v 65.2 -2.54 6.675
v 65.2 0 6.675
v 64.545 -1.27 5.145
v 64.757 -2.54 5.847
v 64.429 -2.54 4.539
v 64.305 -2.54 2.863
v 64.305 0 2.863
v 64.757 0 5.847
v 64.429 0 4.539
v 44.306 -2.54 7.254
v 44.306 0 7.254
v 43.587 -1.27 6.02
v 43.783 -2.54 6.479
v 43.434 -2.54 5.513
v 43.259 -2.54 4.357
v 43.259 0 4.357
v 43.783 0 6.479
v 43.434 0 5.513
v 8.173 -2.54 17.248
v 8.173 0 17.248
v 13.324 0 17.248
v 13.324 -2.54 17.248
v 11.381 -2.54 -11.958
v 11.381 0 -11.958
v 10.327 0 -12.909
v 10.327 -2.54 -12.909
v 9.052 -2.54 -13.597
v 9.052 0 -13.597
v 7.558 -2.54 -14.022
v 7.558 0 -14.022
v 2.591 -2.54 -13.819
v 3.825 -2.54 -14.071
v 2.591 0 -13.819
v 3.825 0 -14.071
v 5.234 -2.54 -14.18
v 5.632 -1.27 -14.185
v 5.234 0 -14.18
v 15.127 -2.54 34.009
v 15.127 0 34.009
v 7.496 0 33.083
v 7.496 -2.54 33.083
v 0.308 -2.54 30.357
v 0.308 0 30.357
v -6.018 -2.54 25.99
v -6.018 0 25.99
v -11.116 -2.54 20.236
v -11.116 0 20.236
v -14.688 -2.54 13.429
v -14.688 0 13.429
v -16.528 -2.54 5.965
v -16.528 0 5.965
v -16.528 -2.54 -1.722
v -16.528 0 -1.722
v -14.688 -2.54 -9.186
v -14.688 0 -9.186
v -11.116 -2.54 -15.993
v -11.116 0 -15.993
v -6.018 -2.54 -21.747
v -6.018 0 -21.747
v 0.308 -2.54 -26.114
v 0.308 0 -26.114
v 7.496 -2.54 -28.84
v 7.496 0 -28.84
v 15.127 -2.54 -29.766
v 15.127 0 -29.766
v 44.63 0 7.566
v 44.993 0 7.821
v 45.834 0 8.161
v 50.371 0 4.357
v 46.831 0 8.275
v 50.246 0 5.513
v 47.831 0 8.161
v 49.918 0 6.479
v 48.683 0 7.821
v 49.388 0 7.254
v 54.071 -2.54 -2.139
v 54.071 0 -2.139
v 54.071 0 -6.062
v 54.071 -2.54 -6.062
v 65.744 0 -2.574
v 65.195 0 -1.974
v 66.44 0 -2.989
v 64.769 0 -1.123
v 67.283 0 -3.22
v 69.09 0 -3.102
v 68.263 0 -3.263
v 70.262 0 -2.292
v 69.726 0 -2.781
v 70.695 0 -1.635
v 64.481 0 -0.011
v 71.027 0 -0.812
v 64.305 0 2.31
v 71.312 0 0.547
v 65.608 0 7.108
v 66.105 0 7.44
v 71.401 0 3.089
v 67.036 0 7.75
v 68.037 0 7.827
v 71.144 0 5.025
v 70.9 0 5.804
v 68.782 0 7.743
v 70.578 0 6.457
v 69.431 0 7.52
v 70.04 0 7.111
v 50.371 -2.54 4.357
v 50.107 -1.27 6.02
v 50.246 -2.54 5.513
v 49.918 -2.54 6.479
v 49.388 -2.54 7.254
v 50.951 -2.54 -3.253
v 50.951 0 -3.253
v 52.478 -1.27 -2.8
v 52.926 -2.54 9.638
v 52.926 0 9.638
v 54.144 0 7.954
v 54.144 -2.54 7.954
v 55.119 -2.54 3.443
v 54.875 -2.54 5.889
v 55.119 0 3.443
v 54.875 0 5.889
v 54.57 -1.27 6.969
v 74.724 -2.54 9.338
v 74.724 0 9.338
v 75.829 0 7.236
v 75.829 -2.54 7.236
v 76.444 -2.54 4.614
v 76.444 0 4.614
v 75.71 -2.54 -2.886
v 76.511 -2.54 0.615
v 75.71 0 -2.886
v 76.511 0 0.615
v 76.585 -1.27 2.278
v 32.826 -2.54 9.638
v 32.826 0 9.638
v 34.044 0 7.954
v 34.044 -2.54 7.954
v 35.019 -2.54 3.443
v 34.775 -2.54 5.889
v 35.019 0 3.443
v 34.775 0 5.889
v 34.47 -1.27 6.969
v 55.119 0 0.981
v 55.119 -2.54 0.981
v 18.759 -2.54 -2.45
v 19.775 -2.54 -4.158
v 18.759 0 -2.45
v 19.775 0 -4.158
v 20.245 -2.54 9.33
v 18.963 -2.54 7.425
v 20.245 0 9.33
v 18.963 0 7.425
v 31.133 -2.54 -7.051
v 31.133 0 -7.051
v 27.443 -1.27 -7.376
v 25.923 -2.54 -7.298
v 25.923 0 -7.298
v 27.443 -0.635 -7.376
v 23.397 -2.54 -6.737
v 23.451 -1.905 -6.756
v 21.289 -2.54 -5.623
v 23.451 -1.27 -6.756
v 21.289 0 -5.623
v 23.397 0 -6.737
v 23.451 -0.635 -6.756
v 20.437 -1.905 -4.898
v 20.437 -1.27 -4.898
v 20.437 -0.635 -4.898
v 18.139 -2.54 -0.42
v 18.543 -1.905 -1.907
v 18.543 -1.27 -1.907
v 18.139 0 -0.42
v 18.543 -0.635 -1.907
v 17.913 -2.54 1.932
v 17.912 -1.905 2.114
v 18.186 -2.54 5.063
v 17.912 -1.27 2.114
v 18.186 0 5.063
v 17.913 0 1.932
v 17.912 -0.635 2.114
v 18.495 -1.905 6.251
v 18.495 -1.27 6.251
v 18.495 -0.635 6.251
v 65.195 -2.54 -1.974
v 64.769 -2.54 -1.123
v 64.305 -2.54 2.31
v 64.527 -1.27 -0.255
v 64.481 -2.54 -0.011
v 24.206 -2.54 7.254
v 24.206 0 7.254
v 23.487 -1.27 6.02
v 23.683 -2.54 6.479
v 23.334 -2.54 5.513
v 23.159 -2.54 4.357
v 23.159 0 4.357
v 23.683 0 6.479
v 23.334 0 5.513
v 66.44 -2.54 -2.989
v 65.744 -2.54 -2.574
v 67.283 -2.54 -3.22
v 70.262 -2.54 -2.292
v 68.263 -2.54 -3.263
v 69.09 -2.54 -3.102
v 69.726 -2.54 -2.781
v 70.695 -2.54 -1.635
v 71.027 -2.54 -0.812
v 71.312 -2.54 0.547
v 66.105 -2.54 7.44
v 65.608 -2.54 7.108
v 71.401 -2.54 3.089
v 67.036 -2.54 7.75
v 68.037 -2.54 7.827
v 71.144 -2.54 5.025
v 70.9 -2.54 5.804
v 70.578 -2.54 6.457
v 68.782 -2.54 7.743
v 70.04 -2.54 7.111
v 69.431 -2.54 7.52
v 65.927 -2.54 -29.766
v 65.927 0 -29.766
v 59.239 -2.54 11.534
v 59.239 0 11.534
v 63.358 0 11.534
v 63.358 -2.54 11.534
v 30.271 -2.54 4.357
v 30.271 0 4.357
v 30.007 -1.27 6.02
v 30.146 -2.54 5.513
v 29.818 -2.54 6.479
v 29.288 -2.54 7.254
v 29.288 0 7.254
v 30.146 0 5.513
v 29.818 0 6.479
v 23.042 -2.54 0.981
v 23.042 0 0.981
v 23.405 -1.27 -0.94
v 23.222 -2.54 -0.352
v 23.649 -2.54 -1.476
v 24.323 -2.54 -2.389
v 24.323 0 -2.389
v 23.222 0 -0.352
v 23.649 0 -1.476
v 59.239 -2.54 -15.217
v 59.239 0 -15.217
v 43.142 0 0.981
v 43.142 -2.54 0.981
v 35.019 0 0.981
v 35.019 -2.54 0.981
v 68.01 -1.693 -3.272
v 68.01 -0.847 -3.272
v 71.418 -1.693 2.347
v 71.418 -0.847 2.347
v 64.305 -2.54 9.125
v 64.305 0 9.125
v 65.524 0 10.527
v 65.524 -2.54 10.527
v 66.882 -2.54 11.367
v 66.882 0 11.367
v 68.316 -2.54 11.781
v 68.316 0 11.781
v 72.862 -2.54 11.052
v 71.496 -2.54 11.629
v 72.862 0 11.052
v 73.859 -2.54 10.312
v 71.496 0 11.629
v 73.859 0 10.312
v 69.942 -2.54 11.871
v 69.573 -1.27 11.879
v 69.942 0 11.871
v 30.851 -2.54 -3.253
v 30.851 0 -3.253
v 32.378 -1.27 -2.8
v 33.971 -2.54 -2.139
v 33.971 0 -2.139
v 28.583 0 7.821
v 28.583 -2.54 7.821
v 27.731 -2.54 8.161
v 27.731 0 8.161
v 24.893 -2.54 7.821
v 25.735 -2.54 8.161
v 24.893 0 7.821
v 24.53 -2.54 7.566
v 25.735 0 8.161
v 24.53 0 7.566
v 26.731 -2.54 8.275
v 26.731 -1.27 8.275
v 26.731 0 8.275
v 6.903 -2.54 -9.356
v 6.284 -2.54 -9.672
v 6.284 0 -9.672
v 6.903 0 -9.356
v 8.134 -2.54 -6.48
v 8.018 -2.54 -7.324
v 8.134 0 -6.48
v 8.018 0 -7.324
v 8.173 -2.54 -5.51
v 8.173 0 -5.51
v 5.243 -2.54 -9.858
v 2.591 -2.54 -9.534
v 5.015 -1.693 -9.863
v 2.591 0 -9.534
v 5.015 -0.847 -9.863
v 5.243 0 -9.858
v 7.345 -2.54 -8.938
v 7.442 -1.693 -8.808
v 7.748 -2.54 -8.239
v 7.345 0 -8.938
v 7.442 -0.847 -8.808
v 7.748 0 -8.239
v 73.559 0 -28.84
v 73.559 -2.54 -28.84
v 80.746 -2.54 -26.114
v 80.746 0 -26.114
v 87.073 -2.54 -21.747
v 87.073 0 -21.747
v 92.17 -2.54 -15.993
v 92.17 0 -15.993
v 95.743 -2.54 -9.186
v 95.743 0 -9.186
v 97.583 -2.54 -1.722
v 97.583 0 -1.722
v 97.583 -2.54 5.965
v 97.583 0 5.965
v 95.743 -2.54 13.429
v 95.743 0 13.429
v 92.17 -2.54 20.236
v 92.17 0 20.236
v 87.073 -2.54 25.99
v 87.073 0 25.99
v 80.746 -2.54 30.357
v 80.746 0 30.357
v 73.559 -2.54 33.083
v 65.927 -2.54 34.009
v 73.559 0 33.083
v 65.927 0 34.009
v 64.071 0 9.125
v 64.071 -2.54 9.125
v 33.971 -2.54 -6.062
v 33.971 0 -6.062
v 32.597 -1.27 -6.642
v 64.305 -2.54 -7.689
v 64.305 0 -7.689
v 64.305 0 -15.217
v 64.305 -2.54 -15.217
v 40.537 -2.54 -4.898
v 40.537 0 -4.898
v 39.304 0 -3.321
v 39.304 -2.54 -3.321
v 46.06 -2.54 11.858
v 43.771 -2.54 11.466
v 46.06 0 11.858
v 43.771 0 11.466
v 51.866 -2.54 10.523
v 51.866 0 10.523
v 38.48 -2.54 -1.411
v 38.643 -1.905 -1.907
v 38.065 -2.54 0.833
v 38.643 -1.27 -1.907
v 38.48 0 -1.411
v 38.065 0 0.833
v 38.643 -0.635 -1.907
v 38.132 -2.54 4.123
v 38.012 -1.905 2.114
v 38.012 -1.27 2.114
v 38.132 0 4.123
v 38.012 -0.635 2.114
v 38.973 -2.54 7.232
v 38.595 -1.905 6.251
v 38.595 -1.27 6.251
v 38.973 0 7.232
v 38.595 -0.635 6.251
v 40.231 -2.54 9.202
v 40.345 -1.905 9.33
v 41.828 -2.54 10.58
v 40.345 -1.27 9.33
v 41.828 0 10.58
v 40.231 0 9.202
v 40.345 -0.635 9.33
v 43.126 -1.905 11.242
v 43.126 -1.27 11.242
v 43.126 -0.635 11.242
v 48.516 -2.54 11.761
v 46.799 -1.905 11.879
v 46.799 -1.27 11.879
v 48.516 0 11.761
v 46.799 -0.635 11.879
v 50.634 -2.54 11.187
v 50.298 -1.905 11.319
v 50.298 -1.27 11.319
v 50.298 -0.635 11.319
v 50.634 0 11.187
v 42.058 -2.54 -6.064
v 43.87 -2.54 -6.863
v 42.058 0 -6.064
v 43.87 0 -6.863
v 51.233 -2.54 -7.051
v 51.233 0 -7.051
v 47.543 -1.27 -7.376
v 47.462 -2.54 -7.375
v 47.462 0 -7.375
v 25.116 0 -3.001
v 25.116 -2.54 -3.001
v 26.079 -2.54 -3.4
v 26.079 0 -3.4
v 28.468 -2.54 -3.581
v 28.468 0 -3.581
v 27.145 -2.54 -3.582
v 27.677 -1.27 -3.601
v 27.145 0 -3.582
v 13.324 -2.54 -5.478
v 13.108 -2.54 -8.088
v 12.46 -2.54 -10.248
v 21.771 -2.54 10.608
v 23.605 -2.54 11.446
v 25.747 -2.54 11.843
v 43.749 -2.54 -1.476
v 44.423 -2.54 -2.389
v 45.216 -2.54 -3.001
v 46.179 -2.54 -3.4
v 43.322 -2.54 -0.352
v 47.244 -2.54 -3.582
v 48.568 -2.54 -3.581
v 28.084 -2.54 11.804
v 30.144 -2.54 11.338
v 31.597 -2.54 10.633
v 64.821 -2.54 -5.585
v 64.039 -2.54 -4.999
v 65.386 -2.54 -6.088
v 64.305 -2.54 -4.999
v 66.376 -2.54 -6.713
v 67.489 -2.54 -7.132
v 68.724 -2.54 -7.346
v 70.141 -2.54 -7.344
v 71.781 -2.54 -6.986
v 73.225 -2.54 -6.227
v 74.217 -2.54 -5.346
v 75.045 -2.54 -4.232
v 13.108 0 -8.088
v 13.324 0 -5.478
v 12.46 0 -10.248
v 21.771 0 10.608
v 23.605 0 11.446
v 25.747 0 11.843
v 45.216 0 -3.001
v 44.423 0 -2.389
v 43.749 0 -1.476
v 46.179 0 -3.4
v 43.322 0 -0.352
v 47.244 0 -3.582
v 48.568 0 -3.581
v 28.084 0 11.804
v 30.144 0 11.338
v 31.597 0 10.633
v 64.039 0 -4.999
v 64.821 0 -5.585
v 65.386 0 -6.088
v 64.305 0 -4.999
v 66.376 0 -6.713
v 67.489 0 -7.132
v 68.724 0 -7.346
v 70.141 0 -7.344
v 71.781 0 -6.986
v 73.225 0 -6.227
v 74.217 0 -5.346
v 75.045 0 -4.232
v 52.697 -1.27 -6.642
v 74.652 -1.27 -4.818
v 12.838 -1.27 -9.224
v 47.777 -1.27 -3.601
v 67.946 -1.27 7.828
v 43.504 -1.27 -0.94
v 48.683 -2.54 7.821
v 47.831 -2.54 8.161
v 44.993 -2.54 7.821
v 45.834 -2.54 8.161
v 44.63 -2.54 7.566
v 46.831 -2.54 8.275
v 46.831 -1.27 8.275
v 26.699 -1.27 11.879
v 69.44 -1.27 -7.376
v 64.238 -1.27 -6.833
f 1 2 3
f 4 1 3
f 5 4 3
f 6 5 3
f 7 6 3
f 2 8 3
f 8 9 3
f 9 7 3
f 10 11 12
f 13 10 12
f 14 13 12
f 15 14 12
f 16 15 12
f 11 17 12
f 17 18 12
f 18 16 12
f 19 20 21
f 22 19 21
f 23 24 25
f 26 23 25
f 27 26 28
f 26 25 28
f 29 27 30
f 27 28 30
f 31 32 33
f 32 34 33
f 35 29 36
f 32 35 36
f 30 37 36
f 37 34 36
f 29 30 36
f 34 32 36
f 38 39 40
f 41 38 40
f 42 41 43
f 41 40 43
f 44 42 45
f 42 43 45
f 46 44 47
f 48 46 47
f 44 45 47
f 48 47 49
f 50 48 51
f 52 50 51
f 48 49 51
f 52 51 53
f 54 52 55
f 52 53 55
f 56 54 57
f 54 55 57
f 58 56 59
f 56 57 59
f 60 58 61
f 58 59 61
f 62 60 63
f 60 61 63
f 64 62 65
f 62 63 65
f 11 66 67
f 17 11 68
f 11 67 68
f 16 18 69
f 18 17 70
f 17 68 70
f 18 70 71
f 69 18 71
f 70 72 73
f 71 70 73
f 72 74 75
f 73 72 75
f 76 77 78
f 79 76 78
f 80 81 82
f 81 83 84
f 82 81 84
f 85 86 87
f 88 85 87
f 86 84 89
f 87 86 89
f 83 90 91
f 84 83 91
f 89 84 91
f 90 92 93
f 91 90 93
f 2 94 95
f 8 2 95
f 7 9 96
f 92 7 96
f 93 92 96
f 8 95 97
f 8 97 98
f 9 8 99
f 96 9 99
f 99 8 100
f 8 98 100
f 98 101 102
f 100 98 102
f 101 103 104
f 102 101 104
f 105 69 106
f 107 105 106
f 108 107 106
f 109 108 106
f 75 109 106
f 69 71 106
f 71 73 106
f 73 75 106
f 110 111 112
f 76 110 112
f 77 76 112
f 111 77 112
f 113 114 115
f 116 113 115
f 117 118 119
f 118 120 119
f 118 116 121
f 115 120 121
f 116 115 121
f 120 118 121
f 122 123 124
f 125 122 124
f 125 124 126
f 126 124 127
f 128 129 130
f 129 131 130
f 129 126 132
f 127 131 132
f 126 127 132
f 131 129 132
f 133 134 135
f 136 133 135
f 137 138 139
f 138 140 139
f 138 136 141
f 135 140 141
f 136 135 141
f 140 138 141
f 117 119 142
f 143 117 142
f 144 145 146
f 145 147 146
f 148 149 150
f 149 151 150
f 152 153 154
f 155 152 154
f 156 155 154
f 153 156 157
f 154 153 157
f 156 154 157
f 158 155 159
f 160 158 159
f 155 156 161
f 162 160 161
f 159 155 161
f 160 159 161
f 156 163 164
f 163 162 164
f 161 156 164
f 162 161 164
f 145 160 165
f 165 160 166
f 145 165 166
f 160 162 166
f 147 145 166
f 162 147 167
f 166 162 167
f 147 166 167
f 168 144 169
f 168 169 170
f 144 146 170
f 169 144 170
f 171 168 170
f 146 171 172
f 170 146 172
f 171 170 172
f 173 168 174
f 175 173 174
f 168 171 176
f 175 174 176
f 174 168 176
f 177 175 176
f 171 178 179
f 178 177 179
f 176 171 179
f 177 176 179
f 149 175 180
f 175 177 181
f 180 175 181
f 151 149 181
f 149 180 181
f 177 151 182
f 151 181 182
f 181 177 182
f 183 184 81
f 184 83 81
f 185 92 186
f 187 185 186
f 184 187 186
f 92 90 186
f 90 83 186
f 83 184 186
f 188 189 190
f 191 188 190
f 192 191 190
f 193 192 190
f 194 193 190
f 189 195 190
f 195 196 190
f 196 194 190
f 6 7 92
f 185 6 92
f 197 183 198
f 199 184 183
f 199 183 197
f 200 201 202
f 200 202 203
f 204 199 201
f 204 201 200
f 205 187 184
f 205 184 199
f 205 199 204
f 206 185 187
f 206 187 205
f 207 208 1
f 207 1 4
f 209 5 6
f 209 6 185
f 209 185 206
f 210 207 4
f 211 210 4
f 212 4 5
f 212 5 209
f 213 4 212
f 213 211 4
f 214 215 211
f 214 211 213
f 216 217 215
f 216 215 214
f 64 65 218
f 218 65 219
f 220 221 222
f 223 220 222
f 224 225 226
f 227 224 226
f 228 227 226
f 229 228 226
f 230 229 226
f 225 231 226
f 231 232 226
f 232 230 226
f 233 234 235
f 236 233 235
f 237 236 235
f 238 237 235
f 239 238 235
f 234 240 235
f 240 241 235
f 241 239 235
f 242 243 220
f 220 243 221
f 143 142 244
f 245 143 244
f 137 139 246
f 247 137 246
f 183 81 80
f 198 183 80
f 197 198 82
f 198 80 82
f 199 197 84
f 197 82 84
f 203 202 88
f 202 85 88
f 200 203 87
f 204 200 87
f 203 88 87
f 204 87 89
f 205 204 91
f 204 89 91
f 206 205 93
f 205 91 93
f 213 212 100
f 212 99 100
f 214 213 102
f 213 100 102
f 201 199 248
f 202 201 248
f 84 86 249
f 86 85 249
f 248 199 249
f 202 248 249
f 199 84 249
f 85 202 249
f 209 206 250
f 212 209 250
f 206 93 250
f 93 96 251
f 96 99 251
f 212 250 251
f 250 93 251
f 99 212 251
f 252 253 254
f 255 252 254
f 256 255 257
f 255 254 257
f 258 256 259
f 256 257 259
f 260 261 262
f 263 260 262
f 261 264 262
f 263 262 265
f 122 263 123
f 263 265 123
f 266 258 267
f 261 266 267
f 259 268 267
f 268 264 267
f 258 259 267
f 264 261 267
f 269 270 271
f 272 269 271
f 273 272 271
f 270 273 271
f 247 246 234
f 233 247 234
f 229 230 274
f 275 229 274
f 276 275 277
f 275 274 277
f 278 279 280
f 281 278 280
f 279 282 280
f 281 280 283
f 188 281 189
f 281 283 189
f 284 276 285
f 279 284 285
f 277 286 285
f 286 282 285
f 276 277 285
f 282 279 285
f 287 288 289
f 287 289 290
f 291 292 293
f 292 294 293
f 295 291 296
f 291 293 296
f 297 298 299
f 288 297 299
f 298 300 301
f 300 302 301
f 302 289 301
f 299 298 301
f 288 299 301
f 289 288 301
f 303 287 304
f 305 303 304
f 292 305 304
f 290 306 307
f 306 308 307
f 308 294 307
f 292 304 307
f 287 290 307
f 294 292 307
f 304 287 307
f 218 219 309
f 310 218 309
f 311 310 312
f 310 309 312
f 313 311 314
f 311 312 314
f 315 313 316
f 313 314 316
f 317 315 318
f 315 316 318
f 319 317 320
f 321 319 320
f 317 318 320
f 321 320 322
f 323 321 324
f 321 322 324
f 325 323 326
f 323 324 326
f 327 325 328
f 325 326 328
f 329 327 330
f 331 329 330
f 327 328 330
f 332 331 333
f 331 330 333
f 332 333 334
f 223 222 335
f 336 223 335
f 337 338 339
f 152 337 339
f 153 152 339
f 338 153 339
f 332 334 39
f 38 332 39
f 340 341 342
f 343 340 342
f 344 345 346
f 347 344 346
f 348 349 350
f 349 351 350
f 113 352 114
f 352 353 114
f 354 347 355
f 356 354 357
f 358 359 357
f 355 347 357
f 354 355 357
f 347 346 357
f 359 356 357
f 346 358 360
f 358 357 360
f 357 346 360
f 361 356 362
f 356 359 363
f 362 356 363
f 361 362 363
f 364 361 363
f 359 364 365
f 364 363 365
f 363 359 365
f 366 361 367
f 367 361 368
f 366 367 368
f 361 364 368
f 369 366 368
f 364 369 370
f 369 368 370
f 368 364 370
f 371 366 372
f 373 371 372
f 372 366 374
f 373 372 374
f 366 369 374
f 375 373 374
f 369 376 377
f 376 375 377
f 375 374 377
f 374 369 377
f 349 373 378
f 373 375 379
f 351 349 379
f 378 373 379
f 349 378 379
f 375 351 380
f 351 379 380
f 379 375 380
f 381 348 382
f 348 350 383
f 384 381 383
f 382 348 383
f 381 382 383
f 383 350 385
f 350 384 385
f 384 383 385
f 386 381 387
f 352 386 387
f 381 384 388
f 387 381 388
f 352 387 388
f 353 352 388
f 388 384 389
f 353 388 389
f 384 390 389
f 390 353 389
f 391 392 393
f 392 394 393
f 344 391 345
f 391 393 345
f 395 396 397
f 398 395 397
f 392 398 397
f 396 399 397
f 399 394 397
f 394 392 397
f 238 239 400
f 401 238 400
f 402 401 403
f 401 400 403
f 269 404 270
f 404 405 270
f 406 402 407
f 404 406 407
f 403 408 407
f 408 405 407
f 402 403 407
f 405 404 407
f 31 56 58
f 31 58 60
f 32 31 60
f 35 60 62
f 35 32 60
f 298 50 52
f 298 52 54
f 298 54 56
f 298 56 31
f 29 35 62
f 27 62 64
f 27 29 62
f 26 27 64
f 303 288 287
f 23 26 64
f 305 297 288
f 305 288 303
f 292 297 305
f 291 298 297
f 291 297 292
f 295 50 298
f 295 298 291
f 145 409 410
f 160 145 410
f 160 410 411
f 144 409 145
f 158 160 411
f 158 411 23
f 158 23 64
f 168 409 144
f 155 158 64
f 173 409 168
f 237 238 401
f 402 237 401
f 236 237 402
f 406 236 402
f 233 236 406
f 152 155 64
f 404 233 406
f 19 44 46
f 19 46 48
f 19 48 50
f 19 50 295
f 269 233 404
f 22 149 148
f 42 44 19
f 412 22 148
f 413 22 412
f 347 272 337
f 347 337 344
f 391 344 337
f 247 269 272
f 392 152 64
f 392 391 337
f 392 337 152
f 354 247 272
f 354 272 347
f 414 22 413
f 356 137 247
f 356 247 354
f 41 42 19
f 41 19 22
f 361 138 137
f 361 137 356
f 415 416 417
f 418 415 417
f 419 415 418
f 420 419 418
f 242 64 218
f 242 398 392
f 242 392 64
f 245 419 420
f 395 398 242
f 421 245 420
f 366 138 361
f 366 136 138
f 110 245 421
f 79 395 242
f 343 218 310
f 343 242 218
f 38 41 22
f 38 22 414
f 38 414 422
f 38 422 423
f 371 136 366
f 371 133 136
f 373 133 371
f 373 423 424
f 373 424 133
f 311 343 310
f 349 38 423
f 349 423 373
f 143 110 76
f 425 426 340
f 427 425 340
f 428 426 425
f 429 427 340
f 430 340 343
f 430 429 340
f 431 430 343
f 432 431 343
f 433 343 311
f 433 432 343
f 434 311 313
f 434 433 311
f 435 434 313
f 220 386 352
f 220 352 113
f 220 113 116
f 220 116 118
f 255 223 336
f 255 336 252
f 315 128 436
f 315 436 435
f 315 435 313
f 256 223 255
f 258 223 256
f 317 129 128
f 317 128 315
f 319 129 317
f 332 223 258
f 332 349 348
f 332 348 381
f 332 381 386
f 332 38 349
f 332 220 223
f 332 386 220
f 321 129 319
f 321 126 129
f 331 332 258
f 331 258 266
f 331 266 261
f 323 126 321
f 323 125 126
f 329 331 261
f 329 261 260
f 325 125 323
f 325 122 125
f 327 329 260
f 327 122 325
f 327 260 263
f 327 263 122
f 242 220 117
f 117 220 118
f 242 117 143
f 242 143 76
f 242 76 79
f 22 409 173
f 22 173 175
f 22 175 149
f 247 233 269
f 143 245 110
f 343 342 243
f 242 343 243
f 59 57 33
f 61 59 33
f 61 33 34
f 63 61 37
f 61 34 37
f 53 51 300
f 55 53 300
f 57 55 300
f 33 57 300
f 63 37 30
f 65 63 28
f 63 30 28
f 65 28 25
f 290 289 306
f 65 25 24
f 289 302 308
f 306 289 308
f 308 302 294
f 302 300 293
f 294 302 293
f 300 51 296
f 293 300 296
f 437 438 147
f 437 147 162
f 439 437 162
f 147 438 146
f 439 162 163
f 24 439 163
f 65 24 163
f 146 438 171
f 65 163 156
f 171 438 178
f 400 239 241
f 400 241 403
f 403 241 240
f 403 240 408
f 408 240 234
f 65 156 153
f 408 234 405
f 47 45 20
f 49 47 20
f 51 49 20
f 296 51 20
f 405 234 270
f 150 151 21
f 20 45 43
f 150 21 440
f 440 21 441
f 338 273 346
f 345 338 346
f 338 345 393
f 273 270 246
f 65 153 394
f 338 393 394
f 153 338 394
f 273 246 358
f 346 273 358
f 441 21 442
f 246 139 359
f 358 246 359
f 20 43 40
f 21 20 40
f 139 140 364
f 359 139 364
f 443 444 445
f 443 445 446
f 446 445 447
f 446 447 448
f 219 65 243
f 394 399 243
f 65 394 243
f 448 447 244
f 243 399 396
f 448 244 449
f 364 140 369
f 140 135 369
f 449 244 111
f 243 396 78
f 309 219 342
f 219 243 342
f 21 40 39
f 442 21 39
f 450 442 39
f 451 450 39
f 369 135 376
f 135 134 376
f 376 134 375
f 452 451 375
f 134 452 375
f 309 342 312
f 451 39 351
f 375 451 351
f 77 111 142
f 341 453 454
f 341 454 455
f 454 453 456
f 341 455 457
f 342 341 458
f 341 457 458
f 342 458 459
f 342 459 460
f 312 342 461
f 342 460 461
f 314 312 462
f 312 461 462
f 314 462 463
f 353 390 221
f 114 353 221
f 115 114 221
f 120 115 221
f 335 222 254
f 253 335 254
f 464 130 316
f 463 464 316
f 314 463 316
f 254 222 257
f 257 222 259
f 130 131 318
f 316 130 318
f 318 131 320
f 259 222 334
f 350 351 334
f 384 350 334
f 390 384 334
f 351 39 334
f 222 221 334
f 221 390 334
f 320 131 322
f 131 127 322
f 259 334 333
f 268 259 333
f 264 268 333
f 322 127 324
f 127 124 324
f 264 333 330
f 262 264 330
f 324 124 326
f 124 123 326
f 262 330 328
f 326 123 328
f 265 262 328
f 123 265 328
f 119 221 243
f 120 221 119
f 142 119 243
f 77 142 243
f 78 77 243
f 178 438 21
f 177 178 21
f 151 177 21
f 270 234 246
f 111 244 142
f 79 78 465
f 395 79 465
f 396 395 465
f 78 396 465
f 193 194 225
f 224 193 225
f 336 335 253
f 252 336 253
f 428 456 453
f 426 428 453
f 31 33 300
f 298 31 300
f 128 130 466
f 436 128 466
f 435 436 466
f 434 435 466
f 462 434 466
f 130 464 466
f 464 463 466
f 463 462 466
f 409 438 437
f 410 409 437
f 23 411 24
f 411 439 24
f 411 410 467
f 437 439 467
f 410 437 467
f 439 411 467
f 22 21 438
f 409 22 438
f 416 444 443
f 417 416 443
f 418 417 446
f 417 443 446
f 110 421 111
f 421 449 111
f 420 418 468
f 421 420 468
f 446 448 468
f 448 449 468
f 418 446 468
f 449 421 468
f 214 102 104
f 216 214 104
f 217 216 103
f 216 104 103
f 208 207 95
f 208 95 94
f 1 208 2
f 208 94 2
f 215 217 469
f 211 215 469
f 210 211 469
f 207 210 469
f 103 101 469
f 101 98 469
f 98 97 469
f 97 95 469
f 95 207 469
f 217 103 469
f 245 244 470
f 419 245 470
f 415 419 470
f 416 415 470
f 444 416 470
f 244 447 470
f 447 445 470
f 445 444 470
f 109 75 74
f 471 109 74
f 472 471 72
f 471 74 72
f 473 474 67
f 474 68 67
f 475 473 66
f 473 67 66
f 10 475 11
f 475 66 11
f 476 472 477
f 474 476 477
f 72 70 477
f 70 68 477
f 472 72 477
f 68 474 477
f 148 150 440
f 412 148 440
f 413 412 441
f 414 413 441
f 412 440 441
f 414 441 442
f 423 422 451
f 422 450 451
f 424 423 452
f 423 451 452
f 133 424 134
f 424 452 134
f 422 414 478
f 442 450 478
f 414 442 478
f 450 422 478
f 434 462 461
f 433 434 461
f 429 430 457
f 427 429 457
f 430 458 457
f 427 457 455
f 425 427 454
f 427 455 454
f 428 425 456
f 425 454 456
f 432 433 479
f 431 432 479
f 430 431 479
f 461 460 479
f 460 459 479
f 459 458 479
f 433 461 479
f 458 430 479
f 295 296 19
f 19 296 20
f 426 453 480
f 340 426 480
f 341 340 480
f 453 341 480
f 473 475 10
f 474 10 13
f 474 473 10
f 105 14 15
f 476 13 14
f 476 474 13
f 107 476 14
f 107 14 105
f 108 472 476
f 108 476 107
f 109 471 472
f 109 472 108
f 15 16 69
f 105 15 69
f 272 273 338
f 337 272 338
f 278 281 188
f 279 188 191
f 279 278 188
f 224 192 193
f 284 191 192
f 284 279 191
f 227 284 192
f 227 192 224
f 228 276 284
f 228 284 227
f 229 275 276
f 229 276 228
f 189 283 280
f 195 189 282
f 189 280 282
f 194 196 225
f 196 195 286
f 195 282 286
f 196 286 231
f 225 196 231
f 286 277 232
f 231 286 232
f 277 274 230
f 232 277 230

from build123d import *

# Parameters (mm, degrees)
F1_DEPTH = 2.54
F2_DEPTH = 2.54


with BuildPart() as f1:
    # F0 (on Front) → F1 (new body)
    with BuildSketch(Plane.XZ):
        with BuildLine():
            ThreePointArc((15.1273975771, 34.0092331171), (-16.7603171739, 2.121518366), (15.1273975771, -29.766196385))
            Line((15.1273975771, -29.766196385), (65.9273975771, -29.766196385))
            ThreePointArc((65.9273975771, -29.766196385), (97.8151123282, 2.121518366), (65.9273975771, 34.0092331171))
            Line((65.9273975771, 34.0092331171), (15.1273975771, 34.0092331171))
        make_face()
        with BuildLine():
            ThreePointArc((15.1273975771, -22.7641476952), (-10.2726024229, 2.6358523048), (15.1273975771, 28.0358523048))
            Line((15.1273975771, 28.0358523048), (65.9273975771, 28.0358523048))
            ThreePointArc((65.9273975771, 28.0358523048), (91.3273975771, 2.6358523048), (65.9273975771, -22.7641476952))
            Line((65.9273975771, -22.7641476952), (15.1273975771, -22.7641476952))
        make_face(mode=Mode.SUBTRACT)
        with BuildLine():
            Line((65.9273975771, 28.0358523048), (15.1273975771, 28.0358523048))
            ThreePointArc((15.1273975771, 28.0358523048), (-10.2726024229, 2.6358523048), (15.1273975771, -22.7641476952))
            Line((15.1273975771, -22.7641476952), (65.9273975771, -22.7641476952))
            ThreePointArc((65.9273975771, -22.7641476952), (91.3273975771, 2.6358523048), (65.9273975771, 28.0358523048))
        make_face()
        with BuildLine():
            add(Edge.make_bspline(
                [(11.3809680112, -11.9579570174), (9.4379583838, -14.1853743468), (5.6316796061, -14.1853743468)],
                knots=[0, 0, 0, 1, 1, 1], degree=2))
            add(Edge.make_bspline(
                [(5.6316796061, -14.1853743468), (3.8880211716, -14.1853743468), (2.5909094093, -13.8185681517)],
                knots=[0, 0, 0, 1, 1, 1], degree=2))
            Line((2.5909094093, -13.8185681517), (2.5909094093, -9.5338465109))
            add(Edge.make_bspline(
                [(2.5909094093, -9.5338465109), (3.9199173624, -9.8634404833), (5.0150199158, -9.8634404833)],
                knots=[0, 0, 0, 1, 1, 1], degree=2))
            add(Edge.make_bspline(
                [(5.0150199158, -9.8634404833), (6.710834064, -9.8634404833), (7.4417884382, -8.8082081685)],
                knots=[0, 0, 0, 1, 1, 1], degree=2))
            add(Edge.make_bspline(
                [(7.4417884382, -8.8082081685), (8.1727428124, -7.7529758537), (8.1727428124, -5.5096104288)],
                knots=[0, 0, 0, 1, 1, 1], degree=2))
            Line((8.1727428124, -5.5096104288), (8.1727428124, 17.2483217604))
            Line((8.1727428124, 17.2483217604), (13.3239776387, 17.2483217604))
            Line((13.3239776387, 17.2483217604), (13.3239776387, -5.477714238))
            add(Edge.make_bspline(
                [(13.3239776387, -5.477714238), (13.3239776387, -9.7305396879), (11.3809680112, -11.9579570174)],
                knots=[0, 0, 0, 1, 1, 1], degree=2))
        make_face(mode=Mode.SUBTRACT)
        with BuildLine():
            add(Edge.make_bspline(
                [(73.2250241017, -6.2272747235), (71.6142664625, -7.375537595), (69.4400094512, -7.375537595)],
                knots=[0, 0, 0, 1, 1, 1], degree=2))
            add(Edge.make_bspline(
                [(69.4400094512, -7.375537595), (66.1653338547, -7.375537595), (64.3047227203, -4.9992713748)],
                knots=[0, 0, 0, 1, 1, 1], degree=2))
            Line((64.3047227203, -4.9992713748), (64.0389211297, -4.9992713748))
            add(Edge.make_bspline(
                [(64.0389211297, -4.9992713748), (64.3047227203, -7.3223772769), (64.3047227203, -7.689183472)],
                knots=[0, 0, 0, 1, 1, 1], degree=2))
            Line((64.3047227203, -7.689183472), (64.3047227203, -15.2166845184))
            Line((64.3047227203, -15.2166845184), (59.238544403, -15.2166845184))
            Line((59.238544403, -15.2166845184), (59.238544403, 11.5335875619))
            Line((59.238544403, 11.5335875619), (63.3584690577, 11.5335875619))
            Line((63.3584690577, 11.5335875619), (64.0708173206, 9.1254251509))
            Line((64.0708173206, 9.1254251509), (64.3047227203, 9.1254251509))
            add(Edge.make_bspline(
                [(64.3047227203, 9.1254251509), (66.0855933775, 11.8791296298), (69.5729102465, 11.8791296298)],
                knots=[0, 0, 0, 1, 1, 1], degree=2))
            add(Edge.make_bspline(
                [(69.5729102465, 11.8791296298), (72.8635339384, 11.8791296298), (74.7241450728, 9.3380664234)],
                knots=[0, 0, 0, 1, 1, 1], degree=2))
            add(Edge.make_bspline(
                [(74.7241450728, 9.3380664234), (76.5847562071, 6.797003217), (76.5847562071, 2.2783761764)],
                knots=[0, 0, 0, 1, 1, 1], degree=2))
            add(Edge.make_bspline(
                [(76.5847562071, 2.2783761764), (76.5847562071, -0.6932856067), (75.710268974, -2.8861487294)],
                knots=[0, 0, 0, 1, 1, 1], degree=2))
            add(Edge.make_bspline(
                [(75.710268974, -2.8861487294), (74.8357817408, -5.079011852), (73.2250241017, -6.2272747235)],
                knots=[0, 0, 0, 1, 1, 1], degree=2))
        make_face(mode=Mode.SUBTRACT)
        with BuildLine():
            add(Edge.make_bspline(
                [(31.1326842105, -7.0512596545), (29.6229311758, -7.375537595), (27.4433581326, -7.375537595)],
                knots=[0, 0, 0, 1, 1, 1], degree=2))
            add(Edge.make_bspline(
                [(27.4433581326, -7.375537595), (22.9619433147, -7.375537595), (20.4368282038, -4.8982667704)],
                knots=[0, 0, 0, 1, 1, 1], degree=2))
            add(Edge.make_bspline(
                [(20.4368282038, -4.8982667704), (17.9117130929, -2.4209959458), (17.9117130929, 2.1135791902)],
                knots=[0, 0, 0, 1, 1, 1], degree=2))
            add(Edge.make_bspline(
                [(17.9117130929, 2.1135791902), (17.9117130929, 6.7810551216), (20.2454510585, 9.3300923757)],
                knots=[0, 0, 0, 1, 1, 1], degree=2))
            add(Edge.make_bspline(
                [(20.2454510585, 9.3300923757), (22.5791890242, 11.8791296298), (26.6991136789, 11.8791296298)],
                knots=[0, 0, 0, 1, 1, 1], degree=2))
            add(Edge.make_bspline(
                [(26.6991136789, 11.8791296298), (30.6329772201, 11.8791296298), (32.8258403428, 9.6384222208)],
                knots=[0, 0, 0, 1, 1, 1], degree=2))
            add(Edge.make_bspline(
                [(32.8258403428, 9.6384222208), (35.0187034654, 7.3977148118), (35.0187034654, 3.4425871434)],
                knots=[0, 0, 0, 1, 1, 1], degree=2))
            Line((35.0187034654, 3.4425871434), (35.0187034654, 0.9812644142))
            Line((35.0187034654, 0.9812644142), (23.0416837919, 0.9812644142))
            add(Edge.make_bspline(
                [(23.0416837919, 0.9812644142), (23.1267403009, -1.1770445017), (24.3228474587, -2.3890997549)],
                knots=[0, 0, 0, 1, 1, 1], degree=2))
            add(Edge.make_bspline(
                [(24.3228474587, -2.3890997549), (25.5189546165, -3.6011550082), (27.6772635324, -3.6011550082)],
                knots=[0, 0, 0, 1, 1, 1], degree=2))
            add(Edge.make_bspline(
                [(27.6772635324, -3.6011550082), (29.3571295851, -3.6011550082), (30.8509345244, -3.2529549244)],
                knots=[0, 0, 0, 1, 1, 1], degree=2))
            add(Edge.make_bspline(
                [(30.8509345244, -3.2529549244), (32.3447394637, -2.9047548407), (33.9714451984, -2.1392462597)],
                knots=[0, 0, 0, 1, 1, 1], degree=2))
            Line((33.9714451984, -2.1392462597), (33.9714451984, -6.0624777373))
            add(Edge.make_bspline(
                [(33.9714451984, -6.0624777373), (32.6424372452, -6.7269817139), (31.1326842105, -7.0512596545)],
                knots=[0, 0, 0, 1, 1, 1], degree=2))
        make_face(mode=Mode.SUBTRACT)
        with BuildLine():
            add(Edge.make_bspline(
                [(51.2326004935, -7.0512596545), (49.7228474587, -7.375537595), (47.5432744156, -7.375537595)],
                knots=[0, 0, 0, 1, 1, 1], degree=2))
            add(Edge.make_bspline(
                [(47.5432744156, -7.375537595), (43.0618595977, -7.375537595), (40.5367444868, -4.8982667704)],
                knots=[0, 0, 0, 1, 1, 1], degree=2))
            add(Edge.make_bspline(
                [(40.5367444868, -4.8982667704), (38.0116293758, -2.4209959458), (38.0116293758, 2.1135791902)],
                knots=[0, 0, 0, 1, 1, 1], degree=2))
            add(Edge.make_bspline(
                [(38.0116293758, 2.1135791902), (38.0116293758, 6.7810551216), (40.3453673415, 9.3300923757)],
                knots=[0, 0, 0, 1, 1, 1], degree=2))
            add(Edge.make_bspline(
                [(40.3453673415, 9.3300923757), (42.6791053072, 11.8791296298), (46.7990299619, 11.8791296298)],
                knots=[0, 0, 0, 1, 1, 1], degree=2))
            add(Edge.make_bspline(
                [(46.7990299619, 11.8791296298), (50.7328935031, 11.8791296298), (52.9257566257, 9.6384222208)],
                knots=[0, 0, 0, 1, 1, 1], degree=2))
            add(Edge.make_bspline(
                [(52.9257566257, 9.6384222208), (55.1186197484, 7.3977148118), (55.1186197484, 3.4425871434)],
                knots=[0, 0, 0, 1, 1, 1], degree=2))
            Line((55.1186197484, 3.4425871434), (55.1186197484, 0.9812644142))
            Line((55.1186197484, 0.9812644142), (43.1416000749, 0.9812644142))
            add(Edge.make_bspline(
                [(43.1416000749, 0.9812644142), (43.2266565839, -1.1770445017), (44.4227637417, -2.3890997549)],
                knots=[0, 0, 0, 1, 1, 1], degree=2))
            add(Edge.make_bspline(
                [(44.4227637417, -2.3890997549), (45.6188708995, -3.6011550082), (47.7771798154, -3.6011550082)],
                knots=[0, 0, 0, 1, 1, 1], degree=2))
            add(Edge.make_bspline(
                [(47.7771798154, -3.6011550082), (49.4570458681, -3.6011550082), (50.9508508074, -3.2529549244)],
                knots=[0, 0, 0, 1, 1, 1], degree=2))
            add(Edge.make_bspline(
                [(50.9508508074, -3.2529549244), (52.4446557467, -2.9047548407), (54.0713614813, -2.1392462597)],
                knots=[0, 0, 0, 1, 1, 1], degree=2))
            Line((54.0713614813, -2.1392462597), (54.0713614813, -6.0624777373))
            add(Edge.make_bspline(
                [(54.0713614813, -6.0624777373), (52.7423535282, -6.7269817139), (51.2326004935, -7.0512596545)],
                knots=[0, 0, 0, 1, 1, 1], degree=2))
        make_face(mode=Mode.SUBTRACT)
    extrude(amount=F1_DEPTH)


with BuildPart() as f2:
    # F0 (on Front) → F2 (new body)
    with BuildSketch(Plane.XZ):
        with BuildLine():
            add(Edge.make_bspline(
                [(70.5776402591, 6.456777181), (69.7377072327, 7.8283133887), (67.9462045119, 7.8283133887)],
                knots=[0, 0, 0, 1, 1, 1], degree=2))
            add(Edge.make_bspline(
                [(67.9462045119, 7.8283133887), (66.0643292503, 7.8283133887), (65.2004740807, 6.6747344853)],
                knots=[0, 0, 0, 1, 1, 1], degree=2))
            add(Edge.make_bspline(
                [(65.2004740807, 6.6747344853), (64.3366189112, 5.521155582), (64.3047227203, 2.8631396758)],
                knots=[0, 0, 0, 1, 1, 1], degree=2))
            Line((64.3047227203, 2.8631396758), (64.3047227203, 2.3102723673))
            add(Edge.make_bspline(
                [(64.3047227203, 2.3102723673), (64.3047227203, -0.6773375113), (65.1951580489, -1.9744492735)],
                knots=[0, 0, 0, 1, 1, 1], degree=2))
            add(Edge.make_bspline(
                [(65.1951580489, -1.9744492735), (66.0855933775, -3.2715610358), (68.0099968936, -3.2715610358)],
                knots=[0, 0, 0, 1, 1, 1], degree=2))
            add(Edge.make_bspline(
                [(68.0099968936, -3.2715610358), (71.4175732854, -3.2715610358), (71.4175732854, 2.34748459)],
                knots=[0, 0, 0, 1, 1, 1], degree=2))
            add(Edge.make_bspline(
                [(71.4175732854, 2.34748459), (71.4175732854, 5.0852409734), (70.5776402591, 6.456777181)],
                knots=[0, 0, 0, 1, 1, 1], degree=2))
        make_face()
    extrude(amount=F2_DEPTH)


with BuildPart() as f2b:
    # F0 (on Front) → F2, piece 2 (new body)
    with BuildSketch(Plane.XZ):
        with BuildLine():
            add(Edge.make_bspline(
                [(29.2880211716, 7.2541819529), (28.3417675089, 8.2748600609), (26.7310098698, 8.2748600609)],
                knots=[0, 0, 0, 1, 1, 1], degree=2))
            add(Edge.make_bspline(
                [(26.7310098698, 8.2748600609), (25.1202522306, 8.2748600609), (24.2058947588, 7.2541819529)],
                knots=[0, 0, 0, 1, 1, 1], degree=2))
            add(Edge.make_bspline(
                [(24.2058947588, 7.2541819529), (23.2915372871, 6.2335038449), (23.1586364918, 4.3569446151)],
                knots=[0, 0, 0, 1, 1, 1], degree=2))
            Line((23.1586364918, 4.3569446151), (30.2714870569, 4.3569446151))
            add(Edge.make_bspline(
                [(30.2714870569, 4.3569446151), (30.2342748342, 6.2335038449), (29.2880211716, 7.2541819529)],
                knots=[0, 0, 0, 1, 1, 1], degree=2))
        make_face()
    extrude(amount=F2_DEPTH)


with BuildPart() as f2c:
    # F0 (on Front) → F2, piece 3 (new body)
    with BuildSketch(Plane.XZ):
        with BuildLine():
            add(Edge.make_bspline(
                [(49.3879374545, 7.2541819529), (48.4416837919, 8.2748600609), (46.8309261527, 8.2748600609)],
                knots=[0, 0, 0, 1, 1, 1], degree=2))
            add(Edge.make_bspline(
                [(46.8309261527, 8.2748600609), (45.2201685136, 8.2748600609), (44.3058110418, 7.2541819529)],
                knots=[0, 0, 0, 1, 1, 1], degree=2))
            add(Edge.make_bspline(
                [(44.3058110418, 7.2541819529), (43.3914535701, 6.2335038449), (43.2585527747, 4.3569446151)],
                knots=[0, 0, 0, 1, 1, 1], degree=2))
            Line((43.2585527747, 4.3569446151), (50.3714033398, 4.3569446151))
            add(Edge.make_bspline(
                [(50.3714033398, 4.3569446151), (50.3341911172, 6.2335038449), (49.3879374545, 7.2541819529)],
                knots=[0, 0, 0, 1, 1, 1], degree=2))
        make_face()
    extrude(amount=F2_DEPTH)


solid = Compound([f1.part, f2.part, f2b.part, f2c.part])
